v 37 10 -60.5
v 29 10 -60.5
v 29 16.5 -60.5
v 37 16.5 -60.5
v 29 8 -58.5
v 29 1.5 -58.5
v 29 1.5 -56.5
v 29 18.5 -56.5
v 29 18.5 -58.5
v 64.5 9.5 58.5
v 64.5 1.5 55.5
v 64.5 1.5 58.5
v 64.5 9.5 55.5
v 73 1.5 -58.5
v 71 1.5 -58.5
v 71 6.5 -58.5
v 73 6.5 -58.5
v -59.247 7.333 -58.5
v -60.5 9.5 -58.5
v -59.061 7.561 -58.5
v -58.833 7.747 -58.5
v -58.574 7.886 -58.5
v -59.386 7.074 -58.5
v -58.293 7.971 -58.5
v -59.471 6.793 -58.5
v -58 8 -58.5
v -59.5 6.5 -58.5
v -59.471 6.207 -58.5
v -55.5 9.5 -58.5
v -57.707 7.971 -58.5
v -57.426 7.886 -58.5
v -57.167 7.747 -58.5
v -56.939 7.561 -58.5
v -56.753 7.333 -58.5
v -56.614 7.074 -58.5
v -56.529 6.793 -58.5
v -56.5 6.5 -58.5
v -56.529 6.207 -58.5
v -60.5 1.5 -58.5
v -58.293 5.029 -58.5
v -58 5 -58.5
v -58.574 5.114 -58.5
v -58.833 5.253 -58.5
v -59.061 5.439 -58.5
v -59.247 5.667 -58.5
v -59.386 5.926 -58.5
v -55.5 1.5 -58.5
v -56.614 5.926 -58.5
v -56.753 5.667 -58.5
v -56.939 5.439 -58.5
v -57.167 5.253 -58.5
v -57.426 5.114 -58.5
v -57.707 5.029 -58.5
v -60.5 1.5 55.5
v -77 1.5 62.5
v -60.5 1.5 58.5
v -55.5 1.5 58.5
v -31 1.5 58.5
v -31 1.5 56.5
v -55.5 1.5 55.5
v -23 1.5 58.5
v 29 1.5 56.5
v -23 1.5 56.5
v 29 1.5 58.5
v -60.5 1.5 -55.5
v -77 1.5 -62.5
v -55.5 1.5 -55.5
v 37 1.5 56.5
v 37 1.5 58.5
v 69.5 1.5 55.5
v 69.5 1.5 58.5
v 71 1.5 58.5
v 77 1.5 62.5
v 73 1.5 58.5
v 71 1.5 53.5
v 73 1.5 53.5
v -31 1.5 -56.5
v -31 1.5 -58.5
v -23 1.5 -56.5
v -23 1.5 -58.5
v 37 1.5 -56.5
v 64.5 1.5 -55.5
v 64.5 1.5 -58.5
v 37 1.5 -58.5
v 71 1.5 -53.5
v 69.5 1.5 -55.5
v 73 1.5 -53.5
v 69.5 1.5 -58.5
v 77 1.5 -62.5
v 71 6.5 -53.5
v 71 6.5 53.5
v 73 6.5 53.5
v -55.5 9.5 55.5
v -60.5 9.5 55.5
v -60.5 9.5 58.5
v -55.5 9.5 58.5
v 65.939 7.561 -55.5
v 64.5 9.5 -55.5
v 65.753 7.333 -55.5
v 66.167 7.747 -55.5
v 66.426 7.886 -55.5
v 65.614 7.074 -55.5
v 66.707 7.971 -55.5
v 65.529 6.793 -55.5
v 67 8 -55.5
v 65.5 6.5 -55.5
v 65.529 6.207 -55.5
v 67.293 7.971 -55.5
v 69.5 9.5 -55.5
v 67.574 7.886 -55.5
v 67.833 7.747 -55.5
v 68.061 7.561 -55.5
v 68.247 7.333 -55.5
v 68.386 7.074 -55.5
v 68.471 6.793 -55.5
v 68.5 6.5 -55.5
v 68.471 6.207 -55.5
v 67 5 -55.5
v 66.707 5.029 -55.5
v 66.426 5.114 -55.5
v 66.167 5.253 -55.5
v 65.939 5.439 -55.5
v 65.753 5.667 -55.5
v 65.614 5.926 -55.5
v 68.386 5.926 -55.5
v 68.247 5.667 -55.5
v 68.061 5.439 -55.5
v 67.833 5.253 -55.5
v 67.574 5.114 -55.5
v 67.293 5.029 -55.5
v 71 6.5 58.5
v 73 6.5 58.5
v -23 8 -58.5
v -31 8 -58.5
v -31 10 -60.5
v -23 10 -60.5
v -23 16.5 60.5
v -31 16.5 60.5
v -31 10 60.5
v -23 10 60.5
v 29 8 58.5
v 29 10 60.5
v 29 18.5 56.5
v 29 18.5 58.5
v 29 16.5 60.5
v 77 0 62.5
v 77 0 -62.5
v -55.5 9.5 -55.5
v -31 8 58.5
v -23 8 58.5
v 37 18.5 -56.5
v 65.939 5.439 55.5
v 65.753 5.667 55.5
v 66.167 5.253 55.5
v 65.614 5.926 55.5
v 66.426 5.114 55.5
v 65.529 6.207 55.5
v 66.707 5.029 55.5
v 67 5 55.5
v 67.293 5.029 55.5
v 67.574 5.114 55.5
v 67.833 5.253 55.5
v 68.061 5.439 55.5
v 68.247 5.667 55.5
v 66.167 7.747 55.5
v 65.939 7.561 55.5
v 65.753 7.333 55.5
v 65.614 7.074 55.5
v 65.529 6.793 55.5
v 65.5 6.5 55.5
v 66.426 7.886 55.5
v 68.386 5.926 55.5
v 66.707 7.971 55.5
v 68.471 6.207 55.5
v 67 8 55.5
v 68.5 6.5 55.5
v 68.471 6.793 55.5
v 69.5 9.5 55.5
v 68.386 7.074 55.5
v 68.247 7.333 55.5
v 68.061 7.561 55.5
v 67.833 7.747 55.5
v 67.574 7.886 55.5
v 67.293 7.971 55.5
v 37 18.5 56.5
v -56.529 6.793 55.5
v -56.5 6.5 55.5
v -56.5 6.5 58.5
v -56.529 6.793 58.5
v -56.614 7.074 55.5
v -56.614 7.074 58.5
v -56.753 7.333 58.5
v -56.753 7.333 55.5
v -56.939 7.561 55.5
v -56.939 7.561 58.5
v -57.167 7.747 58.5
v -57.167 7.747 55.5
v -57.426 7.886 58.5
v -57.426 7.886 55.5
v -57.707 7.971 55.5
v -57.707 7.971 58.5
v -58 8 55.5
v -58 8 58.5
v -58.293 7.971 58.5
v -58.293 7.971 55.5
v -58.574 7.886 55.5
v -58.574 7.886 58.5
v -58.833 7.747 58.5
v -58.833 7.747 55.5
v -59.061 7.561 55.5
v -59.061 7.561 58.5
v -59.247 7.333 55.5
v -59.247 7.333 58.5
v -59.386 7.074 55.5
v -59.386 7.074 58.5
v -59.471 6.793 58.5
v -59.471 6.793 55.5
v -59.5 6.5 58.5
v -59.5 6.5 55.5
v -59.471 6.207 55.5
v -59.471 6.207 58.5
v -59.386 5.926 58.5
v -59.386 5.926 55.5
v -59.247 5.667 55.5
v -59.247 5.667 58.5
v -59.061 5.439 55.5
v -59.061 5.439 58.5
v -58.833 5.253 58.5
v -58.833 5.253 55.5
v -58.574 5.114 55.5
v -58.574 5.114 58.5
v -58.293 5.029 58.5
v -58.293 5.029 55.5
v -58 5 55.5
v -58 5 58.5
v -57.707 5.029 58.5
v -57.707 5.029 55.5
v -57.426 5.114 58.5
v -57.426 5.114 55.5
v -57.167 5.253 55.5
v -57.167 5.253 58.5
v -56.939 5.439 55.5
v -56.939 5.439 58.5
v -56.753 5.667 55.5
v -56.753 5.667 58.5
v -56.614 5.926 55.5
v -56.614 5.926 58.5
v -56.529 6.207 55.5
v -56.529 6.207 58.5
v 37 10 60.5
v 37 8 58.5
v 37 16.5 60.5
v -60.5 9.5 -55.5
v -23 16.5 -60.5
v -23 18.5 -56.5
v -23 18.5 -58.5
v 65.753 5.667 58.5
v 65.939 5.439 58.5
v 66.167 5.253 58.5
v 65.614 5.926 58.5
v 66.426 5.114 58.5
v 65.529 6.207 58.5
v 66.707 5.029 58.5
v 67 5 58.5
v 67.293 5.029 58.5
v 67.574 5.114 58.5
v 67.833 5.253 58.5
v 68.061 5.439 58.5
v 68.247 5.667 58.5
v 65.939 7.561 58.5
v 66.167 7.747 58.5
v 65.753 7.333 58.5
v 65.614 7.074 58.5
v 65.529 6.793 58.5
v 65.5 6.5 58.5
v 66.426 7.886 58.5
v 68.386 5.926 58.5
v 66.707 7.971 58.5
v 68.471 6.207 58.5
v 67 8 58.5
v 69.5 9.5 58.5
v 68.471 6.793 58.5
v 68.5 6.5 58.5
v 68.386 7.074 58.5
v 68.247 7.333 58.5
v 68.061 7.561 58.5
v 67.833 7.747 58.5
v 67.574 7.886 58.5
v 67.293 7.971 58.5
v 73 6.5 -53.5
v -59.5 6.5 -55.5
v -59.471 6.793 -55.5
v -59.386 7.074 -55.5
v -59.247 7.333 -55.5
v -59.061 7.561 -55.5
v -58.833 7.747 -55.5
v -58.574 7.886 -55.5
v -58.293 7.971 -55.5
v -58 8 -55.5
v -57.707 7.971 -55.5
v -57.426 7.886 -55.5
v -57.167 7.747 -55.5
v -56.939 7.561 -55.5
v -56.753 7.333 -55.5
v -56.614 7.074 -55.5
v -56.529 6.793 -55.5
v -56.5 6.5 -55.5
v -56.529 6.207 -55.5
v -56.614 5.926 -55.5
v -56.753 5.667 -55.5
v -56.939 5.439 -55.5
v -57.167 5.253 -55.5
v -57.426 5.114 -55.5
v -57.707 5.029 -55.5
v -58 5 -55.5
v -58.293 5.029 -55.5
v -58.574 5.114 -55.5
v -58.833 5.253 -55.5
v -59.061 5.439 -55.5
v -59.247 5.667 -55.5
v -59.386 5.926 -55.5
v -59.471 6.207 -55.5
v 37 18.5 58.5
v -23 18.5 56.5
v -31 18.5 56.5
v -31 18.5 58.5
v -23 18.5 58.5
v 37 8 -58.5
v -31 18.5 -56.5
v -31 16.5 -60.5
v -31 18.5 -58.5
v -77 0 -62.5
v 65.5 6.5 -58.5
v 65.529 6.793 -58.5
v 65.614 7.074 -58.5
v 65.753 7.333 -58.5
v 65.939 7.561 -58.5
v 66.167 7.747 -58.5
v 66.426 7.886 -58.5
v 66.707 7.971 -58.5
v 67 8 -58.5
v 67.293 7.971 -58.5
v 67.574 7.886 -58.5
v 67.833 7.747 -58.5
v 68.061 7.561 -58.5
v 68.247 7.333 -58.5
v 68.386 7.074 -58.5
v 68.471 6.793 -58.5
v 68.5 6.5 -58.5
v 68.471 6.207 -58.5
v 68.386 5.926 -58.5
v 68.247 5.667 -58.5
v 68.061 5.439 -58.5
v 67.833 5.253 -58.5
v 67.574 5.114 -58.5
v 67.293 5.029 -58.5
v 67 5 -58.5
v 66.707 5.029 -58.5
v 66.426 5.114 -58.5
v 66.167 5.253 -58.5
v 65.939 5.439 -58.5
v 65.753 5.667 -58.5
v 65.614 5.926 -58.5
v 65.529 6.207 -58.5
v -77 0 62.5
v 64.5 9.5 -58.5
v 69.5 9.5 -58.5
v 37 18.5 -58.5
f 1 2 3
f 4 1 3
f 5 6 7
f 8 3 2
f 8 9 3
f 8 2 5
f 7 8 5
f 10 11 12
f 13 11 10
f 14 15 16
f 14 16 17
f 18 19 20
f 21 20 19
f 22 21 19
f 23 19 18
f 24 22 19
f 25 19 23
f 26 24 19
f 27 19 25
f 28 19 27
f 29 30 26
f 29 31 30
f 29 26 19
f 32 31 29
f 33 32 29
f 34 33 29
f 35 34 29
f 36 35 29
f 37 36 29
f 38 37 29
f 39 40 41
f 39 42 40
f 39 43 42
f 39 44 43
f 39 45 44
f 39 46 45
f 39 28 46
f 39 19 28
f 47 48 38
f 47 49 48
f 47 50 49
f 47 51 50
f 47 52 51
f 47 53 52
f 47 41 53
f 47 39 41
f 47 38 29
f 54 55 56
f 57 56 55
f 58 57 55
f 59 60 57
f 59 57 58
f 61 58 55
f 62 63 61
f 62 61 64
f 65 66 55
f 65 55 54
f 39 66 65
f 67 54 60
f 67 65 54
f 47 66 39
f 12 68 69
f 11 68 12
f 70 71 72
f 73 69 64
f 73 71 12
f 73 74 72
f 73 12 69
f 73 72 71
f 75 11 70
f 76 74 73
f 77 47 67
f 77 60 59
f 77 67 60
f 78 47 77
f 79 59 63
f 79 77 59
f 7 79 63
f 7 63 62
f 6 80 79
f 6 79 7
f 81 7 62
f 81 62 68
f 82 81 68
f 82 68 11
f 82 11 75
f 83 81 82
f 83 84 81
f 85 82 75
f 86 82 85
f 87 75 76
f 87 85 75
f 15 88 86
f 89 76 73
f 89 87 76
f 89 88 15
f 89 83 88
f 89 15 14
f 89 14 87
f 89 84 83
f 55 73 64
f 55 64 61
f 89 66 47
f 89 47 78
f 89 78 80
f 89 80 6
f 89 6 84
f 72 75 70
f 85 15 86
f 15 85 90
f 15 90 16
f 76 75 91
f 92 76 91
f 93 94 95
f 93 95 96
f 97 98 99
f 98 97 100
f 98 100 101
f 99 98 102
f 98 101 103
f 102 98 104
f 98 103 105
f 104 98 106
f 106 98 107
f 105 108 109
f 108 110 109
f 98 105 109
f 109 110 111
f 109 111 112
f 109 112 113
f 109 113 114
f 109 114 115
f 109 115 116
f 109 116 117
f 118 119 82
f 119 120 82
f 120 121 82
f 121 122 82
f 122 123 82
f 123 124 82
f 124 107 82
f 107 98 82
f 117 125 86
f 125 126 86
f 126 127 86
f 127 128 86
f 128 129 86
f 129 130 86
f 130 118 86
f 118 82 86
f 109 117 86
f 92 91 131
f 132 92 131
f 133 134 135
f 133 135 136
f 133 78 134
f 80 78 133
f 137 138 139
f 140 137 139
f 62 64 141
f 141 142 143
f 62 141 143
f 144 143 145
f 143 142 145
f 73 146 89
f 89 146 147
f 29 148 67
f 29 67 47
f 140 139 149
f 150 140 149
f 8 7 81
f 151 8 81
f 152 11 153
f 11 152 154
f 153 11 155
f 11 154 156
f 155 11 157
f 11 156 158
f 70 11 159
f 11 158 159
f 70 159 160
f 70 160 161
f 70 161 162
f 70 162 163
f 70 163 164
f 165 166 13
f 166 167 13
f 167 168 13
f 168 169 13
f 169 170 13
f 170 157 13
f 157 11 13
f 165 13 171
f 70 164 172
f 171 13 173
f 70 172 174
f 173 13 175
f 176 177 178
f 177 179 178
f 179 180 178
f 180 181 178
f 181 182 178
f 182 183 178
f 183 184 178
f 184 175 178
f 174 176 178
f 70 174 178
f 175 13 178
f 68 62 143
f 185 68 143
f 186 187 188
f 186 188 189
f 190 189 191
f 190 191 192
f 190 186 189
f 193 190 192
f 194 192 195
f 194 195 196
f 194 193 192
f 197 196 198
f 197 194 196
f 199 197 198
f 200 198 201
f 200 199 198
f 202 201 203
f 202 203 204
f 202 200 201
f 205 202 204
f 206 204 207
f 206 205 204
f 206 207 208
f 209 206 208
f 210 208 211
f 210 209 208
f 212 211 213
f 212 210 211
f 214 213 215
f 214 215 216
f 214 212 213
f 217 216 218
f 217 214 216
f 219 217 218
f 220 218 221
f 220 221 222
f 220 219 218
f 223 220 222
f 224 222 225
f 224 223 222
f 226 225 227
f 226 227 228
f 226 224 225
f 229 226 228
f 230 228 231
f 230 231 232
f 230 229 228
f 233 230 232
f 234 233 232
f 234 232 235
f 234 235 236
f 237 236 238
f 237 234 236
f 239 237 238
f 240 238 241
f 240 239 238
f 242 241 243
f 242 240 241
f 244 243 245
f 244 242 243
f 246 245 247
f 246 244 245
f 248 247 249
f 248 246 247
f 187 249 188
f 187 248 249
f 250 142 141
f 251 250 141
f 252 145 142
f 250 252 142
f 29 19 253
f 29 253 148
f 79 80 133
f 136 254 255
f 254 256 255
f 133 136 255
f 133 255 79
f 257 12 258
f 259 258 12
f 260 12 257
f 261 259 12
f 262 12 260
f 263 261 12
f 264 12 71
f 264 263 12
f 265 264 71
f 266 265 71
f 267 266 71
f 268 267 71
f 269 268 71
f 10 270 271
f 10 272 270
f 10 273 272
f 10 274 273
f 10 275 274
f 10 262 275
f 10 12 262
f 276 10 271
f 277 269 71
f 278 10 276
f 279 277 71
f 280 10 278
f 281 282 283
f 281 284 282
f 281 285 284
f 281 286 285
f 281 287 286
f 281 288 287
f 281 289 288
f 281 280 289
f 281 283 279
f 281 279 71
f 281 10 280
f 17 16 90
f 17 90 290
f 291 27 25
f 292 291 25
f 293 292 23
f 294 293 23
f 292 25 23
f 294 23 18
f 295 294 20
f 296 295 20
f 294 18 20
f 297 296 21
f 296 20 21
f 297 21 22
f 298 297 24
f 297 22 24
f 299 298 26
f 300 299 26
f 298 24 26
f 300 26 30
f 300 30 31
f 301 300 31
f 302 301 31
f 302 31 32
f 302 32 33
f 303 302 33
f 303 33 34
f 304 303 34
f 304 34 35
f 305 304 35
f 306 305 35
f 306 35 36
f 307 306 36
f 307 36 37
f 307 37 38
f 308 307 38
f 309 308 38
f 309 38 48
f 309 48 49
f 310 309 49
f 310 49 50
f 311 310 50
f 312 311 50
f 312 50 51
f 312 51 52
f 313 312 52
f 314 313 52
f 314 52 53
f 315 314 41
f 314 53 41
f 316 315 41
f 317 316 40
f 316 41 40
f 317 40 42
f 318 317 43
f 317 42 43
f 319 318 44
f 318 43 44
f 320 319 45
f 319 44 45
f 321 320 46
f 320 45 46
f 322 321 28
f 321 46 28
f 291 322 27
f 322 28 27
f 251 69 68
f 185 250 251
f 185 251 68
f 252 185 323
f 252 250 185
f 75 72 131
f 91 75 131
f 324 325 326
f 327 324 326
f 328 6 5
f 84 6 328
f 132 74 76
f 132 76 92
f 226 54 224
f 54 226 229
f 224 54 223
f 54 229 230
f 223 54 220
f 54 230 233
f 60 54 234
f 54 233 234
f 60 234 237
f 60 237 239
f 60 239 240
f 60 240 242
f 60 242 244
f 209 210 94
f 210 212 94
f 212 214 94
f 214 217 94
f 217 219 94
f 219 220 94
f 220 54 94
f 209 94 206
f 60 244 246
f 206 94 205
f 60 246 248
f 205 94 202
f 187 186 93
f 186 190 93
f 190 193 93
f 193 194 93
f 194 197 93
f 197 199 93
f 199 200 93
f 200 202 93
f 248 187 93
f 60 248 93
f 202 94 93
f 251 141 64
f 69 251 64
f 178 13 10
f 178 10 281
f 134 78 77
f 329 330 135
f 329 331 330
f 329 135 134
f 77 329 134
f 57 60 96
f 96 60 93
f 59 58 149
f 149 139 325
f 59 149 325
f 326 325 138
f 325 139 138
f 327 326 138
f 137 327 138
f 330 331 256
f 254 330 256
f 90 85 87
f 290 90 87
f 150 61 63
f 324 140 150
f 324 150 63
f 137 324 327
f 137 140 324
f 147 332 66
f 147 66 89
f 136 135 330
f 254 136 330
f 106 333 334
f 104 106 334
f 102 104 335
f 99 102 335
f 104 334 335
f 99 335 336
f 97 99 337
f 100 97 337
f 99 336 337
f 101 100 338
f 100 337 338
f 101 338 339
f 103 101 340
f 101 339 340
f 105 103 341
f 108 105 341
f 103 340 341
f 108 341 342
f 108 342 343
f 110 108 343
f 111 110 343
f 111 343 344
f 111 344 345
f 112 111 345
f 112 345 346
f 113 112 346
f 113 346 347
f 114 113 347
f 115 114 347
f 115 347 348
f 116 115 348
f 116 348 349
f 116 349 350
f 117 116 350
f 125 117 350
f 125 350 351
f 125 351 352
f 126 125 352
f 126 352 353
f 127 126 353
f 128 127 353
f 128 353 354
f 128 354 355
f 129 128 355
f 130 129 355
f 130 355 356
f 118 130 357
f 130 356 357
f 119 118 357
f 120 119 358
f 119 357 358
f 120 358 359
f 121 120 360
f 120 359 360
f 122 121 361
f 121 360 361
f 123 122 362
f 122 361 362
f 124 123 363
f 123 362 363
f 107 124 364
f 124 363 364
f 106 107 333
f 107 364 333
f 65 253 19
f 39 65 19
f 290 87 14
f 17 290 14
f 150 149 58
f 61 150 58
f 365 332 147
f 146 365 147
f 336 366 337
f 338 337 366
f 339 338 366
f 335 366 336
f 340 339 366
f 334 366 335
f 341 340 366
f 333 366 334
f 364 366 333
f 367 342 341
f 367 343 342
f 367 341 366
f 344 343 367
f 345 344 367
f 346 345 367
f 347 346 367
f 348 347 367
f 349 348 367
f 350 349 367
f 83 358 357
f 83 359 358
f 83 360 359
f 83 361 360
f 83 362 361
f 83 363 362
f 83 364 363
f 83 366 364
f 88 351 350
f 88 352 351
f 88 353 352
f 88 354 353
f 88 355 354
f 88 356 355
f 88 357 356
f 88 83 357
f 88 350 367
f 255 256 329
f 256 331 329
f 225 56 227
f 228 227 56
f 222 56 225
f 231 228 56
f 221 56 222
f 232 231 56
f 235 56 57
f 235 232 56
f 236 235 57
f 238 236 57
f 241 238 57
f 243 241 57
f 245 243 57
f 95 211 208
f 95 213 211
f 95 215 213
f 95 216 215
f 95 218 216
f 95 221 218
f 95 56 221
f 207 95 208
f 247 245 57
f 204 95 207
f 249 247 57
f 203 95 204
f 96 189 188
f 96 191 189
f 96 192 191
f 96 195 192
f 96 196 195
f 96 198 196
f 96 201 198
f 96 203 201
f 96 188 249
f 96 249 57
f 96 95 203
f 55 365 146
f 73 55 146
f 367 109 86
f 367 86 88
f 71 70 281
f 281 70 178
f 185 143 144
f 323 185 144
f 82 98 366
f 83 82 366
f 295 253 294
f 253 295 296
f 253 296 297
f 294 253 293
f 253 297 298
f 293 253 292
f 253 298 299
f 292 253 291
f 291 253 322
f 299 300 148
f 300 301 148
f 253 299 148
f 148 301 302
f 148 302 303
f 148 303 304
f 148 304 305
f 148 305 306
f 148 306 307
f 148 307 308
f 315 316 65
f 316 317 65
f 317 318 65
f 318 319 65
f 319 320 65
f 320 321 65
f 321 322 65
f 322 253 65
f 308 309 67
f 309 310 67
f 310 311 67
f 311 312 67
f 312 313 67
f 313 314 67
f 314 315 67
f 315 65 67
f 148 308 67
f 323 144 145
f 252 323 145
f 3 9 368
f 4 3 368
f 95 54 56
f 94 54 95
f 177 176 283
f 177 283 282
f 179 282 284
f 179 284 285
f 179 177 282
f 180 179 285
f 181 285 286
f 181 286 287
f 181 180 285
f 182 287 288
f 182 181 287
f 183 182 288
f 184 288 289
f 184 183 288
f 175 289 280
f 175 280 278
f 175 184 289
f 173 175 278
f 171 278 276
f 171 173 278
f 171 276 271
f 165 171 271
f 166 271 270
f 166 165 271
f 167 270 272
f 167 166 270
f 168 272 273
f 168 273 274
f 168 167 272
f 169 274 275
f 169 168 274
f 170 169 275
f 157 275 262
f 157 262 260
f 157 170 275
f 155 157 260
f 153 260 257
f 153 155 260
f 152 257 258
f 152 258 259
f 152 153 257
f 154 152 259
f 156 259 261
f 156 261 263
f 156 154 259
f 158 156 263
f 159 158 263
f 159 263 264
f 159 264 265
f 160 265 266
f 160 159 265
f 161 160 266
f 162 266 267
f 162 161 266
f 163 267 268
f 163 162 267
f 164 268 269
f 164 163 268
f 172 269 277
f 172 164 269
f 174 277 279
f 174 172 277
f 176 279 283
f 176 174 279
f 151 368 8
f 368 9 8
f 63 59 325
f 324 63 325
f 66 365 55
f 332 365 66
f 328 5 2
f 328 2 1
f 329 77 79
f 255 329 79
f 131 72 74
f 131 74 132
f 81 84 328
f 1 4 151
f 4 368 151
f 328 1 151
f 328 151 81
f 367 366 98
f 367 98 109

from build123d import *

# Parameters (mm, degrees)
SKETCH1_W                  = 154
SKETCH1_H                  = 125
BOSS_EXTRUDE1_DEPTH        = 1.5
SKETCH2_W                  = 2
SKETCH2_H                  = 5
BOSS_EXTRUDE2_DEPTH        = 5
SKETCH3_W                  = 8
SKETCH3_H                  = 2
BOSS_EXTRUDE3_DEPTH        = 17
SKETCH4_W                  = 2
SKETCH4_H                  = 10.5
BOSS_EXTRUDE4_DEPTH        = 8
CHAMFER1_SIZE              = 2
LPATTERN1_COUNT            = 2
LPATTERN1_PITCH            = 60
CHAMFER1_OF_LPATTERN1_SIZE = 2
SKETCH5_W                  = 5
SKETCH5_H                  = 3
BOSS_EXTRUDE5_DEPTH        = 8
CUT_EXTRUDE1_REACH         = 146.611
SKETCH6_R                  = 1.5
LPATTERN2_COUNT            = 2
LPATTERN2_PITCH            = 125
MIRROR1_START              = -31
MIRROR1_DEPTH              = 8
MIRROR1_START_2            = 29
MIRROR1_2_DEPTH            = 8
MIRROR1_START_3            = 71
MIRROR1_3_OUTLINE_W        = 5
MIRROR1_3_OUTLINE_H        = 5
MIRROR1_3_DEPTH            = 2
MIRROR1_START_4            = 55.5
MIRROR1_4_OUTLINE_W        = 5
MIRROR1_4_OUTLINE_H        = 8
MIRROR1_4_OUTLINE_R        = 1.5
MIRROR1_4_DEPTH            = 3


# Read off the part's stored shape, not the designer's step: Mirror1
with BuildPart() as part:
    # Sketch1 → Boss-Extrude1 (new body)
    with BuildSketch(Plane(origin=(0, 0, 0), x_dir=(1, 0, 0), z_dir=(0, 1, 0))):
        Rectangle(SKETCH1_W, SKETCH1_H)
    extrude(amount=BOSS_EXTRUDE1_DEPTH)

    # Sketch2 → Boss-Extrude2 (add)
    with BuildSketch(Plane(origin=(0, 1.5, 0), x_dir=(1, 0, 0), z_dir=(0, 1, 0))):
        with Locations((72, 56)):
            Rectangle(SKETCH2_W, SKETCH2_H)
    extrude(amount=BOSS_EXTRUDE2_DEPTH)

    # Sketch3 → Boss-Extrude3 (add)
    with BuildSketch(Plane(origin=(0, 1.5, 0), x_dir=(1, 0, 0), z_dir=(0, 1, 0))):
        with Locations((-27, 57.5)):
            Rectangle(SKETCH3_W, SKETCH3_H)
    boss_extrude3 = extrude(amount=BOSS_EXTRUDE3_DEPTH)

    # Sketch4 → Boss-Extrude4 (add)
    with BuildSketch(Plane.ZY.offset(31)):
        with Locations((-59.5, 13.25)):
            Rectangle(SKETCH4_W, SKETCH4_H)
    boss_extrude4 = extrude(amount=-BOSS_EXTRUDE4_DEPTH)

    # Chamfer1
    chamfer1_edges = [part.edges().sort_by_distance(p)[0] for p in [
        (-27, 18.5, -60.5),
        (-27, 8, -60.5),
    ]]
    chamfer(chamfer1_edges, length=CHAMFER1_SIZE - 0.0001)  # a hair under: the kernel refuses the full size

    # LPattern1: Boss-Extrude3, Boss-Extrude4 ×2
    with Locations(*[(i * LPATTERN1_PITCH, 0, 0) for i in range(1, LPATTERN1_COUNT)]):
        add(boss_extrude3)
        add(boss_extrude4)

    # Chamfer1 of LPattern1
    chamfer1_of_lpattern1_edges = [part.edges().sort_by_distance(p)[0] for p in [
        (33, 18.5, -60.5),
        (33, 8, -60.5),
    ]]
    chamfer(chamfer1_of_lpattern1_edges, length=CHAMFER1_OF_LPATTERN1_SIZE - 0.0001)  # a hair under: the kernel refuses the full size

    # Sketch5 → Boss-Extrude5 (add)
    with BuildSketch(Plane(origin=(0, 1.5, 0), x_dir=(1, 0, 0), z_dir=(0, 1, 0))):
        with Locations((67, 57)):
            Rectangle(SKETCH5_W, SKETCH5_H)
    boss_extrude5 = extrude(amount=BOSS_EXTRUDE5_DEPTH)

    # Sketch6 → Cut-Extrude1 (cut, up to next)
    with BuildSketch(Plane(origin=(0, 0, -58.5), x_dir=(-1, 0, 0), z_dir=(0, 0, -1)), mode=Mode.PRIVATE) as cut_extrude1_sk1:
        with Locations((-67, 6.5)):
            Circle(SKETCH6_R)
    cut_extrude1_tool1 = extrude(cut_extrude1_sk1.sketch, amount=-CUT_EXTRUDE1_REACH, mode=Mode.PRIVATE) & part.part
    cut_extrude1 = cut_extrude1_tool1.solids().sort_by_distance((67, 6.5, -58.5))[0]
    add(cut_extrude1, mode=Mode.SUBTRACT)

    # LPattern2: Boss-Extrude5, Cut-Extrude1 ×2
    with Locations(*[(-i * LPATTERN2_PITCH, 0, 0) for i in range(1, LPATTERN2_COUNT)]):
        add(boss_extrude5)
        add(cut_extrude1, mode=Mode.SUBTRACT)

    # Mirror1 outline → Mirror1 (add)
    with BuildSketch(Plane.YZ.offset(MIRROR1_START)):
        Polygon((10, 60.5), (8, 58.5), (1.5, 58.5), (1.5, 56.5), (18.5, 56.5), (18.5, 58.5), (16.5, 60.5), align=None)
    extrude(amount=MIRROR1_DEPTH)

    # Mirror1 2 outline → Mirror1 2 (add)
    with BuildSketch(Plane.YZ.offset(MIRROR1_START_2)):
        Polygon((10, 60.5), (8, 58.5), (1.5, 58.5), (1.5, 56.5), (18.5, 56.5), (18.5, 58.5), (16.5, 60.5), align=None)
    extrude(amount=MIRROR1_2_DEPTH)

    # Mirror1 3 outline → Mirror1 3 (add)
    with BuildSketch(Plane.YZ.offset(MIRROR1_START_3)):
        with Locations((4, 56)):
            Rectangle(MIRROR1_3_OUTLINE_W, MIRROR1_3_OUTLINE_H)
    extrude(amount=MIRROR1_3_DEPTH)

    # Mirror1 4 outline → Mirror1 4 (add)
    # profile 1 of 2: a face of its own
    with BuildSketch(Plane.XY.offset(MIRROR1_START_4)):
        with Locations((67, 5.5)):
            Rectangle(MIRROR1_4_OUTLINE_W, MIRROR1_4_OUTLINE_H)
        with Locations((67, 6.5)):
            Circle(MIRROR1_4_OUTLINE_R, mode=Mode.SUBTRACT)
    # profile 2 of 2: a face of its own
    with BuildSketch(Plane.XY.offset(MIRROR1_START_4)):
        with Locations((-58, 5.5)):
            Rectangle(MIRROR1_4_OUTLINE_W, MIRROR1_4_OUTLINE_H)
        with Locations((-58, 6.5)):
            Circle(MIRROR1_4_OUTLINE_R, mode=Mode.SUBTRACT)
    extrude(amount=MIRROR1_4_DEPTH)


solid = part.part
